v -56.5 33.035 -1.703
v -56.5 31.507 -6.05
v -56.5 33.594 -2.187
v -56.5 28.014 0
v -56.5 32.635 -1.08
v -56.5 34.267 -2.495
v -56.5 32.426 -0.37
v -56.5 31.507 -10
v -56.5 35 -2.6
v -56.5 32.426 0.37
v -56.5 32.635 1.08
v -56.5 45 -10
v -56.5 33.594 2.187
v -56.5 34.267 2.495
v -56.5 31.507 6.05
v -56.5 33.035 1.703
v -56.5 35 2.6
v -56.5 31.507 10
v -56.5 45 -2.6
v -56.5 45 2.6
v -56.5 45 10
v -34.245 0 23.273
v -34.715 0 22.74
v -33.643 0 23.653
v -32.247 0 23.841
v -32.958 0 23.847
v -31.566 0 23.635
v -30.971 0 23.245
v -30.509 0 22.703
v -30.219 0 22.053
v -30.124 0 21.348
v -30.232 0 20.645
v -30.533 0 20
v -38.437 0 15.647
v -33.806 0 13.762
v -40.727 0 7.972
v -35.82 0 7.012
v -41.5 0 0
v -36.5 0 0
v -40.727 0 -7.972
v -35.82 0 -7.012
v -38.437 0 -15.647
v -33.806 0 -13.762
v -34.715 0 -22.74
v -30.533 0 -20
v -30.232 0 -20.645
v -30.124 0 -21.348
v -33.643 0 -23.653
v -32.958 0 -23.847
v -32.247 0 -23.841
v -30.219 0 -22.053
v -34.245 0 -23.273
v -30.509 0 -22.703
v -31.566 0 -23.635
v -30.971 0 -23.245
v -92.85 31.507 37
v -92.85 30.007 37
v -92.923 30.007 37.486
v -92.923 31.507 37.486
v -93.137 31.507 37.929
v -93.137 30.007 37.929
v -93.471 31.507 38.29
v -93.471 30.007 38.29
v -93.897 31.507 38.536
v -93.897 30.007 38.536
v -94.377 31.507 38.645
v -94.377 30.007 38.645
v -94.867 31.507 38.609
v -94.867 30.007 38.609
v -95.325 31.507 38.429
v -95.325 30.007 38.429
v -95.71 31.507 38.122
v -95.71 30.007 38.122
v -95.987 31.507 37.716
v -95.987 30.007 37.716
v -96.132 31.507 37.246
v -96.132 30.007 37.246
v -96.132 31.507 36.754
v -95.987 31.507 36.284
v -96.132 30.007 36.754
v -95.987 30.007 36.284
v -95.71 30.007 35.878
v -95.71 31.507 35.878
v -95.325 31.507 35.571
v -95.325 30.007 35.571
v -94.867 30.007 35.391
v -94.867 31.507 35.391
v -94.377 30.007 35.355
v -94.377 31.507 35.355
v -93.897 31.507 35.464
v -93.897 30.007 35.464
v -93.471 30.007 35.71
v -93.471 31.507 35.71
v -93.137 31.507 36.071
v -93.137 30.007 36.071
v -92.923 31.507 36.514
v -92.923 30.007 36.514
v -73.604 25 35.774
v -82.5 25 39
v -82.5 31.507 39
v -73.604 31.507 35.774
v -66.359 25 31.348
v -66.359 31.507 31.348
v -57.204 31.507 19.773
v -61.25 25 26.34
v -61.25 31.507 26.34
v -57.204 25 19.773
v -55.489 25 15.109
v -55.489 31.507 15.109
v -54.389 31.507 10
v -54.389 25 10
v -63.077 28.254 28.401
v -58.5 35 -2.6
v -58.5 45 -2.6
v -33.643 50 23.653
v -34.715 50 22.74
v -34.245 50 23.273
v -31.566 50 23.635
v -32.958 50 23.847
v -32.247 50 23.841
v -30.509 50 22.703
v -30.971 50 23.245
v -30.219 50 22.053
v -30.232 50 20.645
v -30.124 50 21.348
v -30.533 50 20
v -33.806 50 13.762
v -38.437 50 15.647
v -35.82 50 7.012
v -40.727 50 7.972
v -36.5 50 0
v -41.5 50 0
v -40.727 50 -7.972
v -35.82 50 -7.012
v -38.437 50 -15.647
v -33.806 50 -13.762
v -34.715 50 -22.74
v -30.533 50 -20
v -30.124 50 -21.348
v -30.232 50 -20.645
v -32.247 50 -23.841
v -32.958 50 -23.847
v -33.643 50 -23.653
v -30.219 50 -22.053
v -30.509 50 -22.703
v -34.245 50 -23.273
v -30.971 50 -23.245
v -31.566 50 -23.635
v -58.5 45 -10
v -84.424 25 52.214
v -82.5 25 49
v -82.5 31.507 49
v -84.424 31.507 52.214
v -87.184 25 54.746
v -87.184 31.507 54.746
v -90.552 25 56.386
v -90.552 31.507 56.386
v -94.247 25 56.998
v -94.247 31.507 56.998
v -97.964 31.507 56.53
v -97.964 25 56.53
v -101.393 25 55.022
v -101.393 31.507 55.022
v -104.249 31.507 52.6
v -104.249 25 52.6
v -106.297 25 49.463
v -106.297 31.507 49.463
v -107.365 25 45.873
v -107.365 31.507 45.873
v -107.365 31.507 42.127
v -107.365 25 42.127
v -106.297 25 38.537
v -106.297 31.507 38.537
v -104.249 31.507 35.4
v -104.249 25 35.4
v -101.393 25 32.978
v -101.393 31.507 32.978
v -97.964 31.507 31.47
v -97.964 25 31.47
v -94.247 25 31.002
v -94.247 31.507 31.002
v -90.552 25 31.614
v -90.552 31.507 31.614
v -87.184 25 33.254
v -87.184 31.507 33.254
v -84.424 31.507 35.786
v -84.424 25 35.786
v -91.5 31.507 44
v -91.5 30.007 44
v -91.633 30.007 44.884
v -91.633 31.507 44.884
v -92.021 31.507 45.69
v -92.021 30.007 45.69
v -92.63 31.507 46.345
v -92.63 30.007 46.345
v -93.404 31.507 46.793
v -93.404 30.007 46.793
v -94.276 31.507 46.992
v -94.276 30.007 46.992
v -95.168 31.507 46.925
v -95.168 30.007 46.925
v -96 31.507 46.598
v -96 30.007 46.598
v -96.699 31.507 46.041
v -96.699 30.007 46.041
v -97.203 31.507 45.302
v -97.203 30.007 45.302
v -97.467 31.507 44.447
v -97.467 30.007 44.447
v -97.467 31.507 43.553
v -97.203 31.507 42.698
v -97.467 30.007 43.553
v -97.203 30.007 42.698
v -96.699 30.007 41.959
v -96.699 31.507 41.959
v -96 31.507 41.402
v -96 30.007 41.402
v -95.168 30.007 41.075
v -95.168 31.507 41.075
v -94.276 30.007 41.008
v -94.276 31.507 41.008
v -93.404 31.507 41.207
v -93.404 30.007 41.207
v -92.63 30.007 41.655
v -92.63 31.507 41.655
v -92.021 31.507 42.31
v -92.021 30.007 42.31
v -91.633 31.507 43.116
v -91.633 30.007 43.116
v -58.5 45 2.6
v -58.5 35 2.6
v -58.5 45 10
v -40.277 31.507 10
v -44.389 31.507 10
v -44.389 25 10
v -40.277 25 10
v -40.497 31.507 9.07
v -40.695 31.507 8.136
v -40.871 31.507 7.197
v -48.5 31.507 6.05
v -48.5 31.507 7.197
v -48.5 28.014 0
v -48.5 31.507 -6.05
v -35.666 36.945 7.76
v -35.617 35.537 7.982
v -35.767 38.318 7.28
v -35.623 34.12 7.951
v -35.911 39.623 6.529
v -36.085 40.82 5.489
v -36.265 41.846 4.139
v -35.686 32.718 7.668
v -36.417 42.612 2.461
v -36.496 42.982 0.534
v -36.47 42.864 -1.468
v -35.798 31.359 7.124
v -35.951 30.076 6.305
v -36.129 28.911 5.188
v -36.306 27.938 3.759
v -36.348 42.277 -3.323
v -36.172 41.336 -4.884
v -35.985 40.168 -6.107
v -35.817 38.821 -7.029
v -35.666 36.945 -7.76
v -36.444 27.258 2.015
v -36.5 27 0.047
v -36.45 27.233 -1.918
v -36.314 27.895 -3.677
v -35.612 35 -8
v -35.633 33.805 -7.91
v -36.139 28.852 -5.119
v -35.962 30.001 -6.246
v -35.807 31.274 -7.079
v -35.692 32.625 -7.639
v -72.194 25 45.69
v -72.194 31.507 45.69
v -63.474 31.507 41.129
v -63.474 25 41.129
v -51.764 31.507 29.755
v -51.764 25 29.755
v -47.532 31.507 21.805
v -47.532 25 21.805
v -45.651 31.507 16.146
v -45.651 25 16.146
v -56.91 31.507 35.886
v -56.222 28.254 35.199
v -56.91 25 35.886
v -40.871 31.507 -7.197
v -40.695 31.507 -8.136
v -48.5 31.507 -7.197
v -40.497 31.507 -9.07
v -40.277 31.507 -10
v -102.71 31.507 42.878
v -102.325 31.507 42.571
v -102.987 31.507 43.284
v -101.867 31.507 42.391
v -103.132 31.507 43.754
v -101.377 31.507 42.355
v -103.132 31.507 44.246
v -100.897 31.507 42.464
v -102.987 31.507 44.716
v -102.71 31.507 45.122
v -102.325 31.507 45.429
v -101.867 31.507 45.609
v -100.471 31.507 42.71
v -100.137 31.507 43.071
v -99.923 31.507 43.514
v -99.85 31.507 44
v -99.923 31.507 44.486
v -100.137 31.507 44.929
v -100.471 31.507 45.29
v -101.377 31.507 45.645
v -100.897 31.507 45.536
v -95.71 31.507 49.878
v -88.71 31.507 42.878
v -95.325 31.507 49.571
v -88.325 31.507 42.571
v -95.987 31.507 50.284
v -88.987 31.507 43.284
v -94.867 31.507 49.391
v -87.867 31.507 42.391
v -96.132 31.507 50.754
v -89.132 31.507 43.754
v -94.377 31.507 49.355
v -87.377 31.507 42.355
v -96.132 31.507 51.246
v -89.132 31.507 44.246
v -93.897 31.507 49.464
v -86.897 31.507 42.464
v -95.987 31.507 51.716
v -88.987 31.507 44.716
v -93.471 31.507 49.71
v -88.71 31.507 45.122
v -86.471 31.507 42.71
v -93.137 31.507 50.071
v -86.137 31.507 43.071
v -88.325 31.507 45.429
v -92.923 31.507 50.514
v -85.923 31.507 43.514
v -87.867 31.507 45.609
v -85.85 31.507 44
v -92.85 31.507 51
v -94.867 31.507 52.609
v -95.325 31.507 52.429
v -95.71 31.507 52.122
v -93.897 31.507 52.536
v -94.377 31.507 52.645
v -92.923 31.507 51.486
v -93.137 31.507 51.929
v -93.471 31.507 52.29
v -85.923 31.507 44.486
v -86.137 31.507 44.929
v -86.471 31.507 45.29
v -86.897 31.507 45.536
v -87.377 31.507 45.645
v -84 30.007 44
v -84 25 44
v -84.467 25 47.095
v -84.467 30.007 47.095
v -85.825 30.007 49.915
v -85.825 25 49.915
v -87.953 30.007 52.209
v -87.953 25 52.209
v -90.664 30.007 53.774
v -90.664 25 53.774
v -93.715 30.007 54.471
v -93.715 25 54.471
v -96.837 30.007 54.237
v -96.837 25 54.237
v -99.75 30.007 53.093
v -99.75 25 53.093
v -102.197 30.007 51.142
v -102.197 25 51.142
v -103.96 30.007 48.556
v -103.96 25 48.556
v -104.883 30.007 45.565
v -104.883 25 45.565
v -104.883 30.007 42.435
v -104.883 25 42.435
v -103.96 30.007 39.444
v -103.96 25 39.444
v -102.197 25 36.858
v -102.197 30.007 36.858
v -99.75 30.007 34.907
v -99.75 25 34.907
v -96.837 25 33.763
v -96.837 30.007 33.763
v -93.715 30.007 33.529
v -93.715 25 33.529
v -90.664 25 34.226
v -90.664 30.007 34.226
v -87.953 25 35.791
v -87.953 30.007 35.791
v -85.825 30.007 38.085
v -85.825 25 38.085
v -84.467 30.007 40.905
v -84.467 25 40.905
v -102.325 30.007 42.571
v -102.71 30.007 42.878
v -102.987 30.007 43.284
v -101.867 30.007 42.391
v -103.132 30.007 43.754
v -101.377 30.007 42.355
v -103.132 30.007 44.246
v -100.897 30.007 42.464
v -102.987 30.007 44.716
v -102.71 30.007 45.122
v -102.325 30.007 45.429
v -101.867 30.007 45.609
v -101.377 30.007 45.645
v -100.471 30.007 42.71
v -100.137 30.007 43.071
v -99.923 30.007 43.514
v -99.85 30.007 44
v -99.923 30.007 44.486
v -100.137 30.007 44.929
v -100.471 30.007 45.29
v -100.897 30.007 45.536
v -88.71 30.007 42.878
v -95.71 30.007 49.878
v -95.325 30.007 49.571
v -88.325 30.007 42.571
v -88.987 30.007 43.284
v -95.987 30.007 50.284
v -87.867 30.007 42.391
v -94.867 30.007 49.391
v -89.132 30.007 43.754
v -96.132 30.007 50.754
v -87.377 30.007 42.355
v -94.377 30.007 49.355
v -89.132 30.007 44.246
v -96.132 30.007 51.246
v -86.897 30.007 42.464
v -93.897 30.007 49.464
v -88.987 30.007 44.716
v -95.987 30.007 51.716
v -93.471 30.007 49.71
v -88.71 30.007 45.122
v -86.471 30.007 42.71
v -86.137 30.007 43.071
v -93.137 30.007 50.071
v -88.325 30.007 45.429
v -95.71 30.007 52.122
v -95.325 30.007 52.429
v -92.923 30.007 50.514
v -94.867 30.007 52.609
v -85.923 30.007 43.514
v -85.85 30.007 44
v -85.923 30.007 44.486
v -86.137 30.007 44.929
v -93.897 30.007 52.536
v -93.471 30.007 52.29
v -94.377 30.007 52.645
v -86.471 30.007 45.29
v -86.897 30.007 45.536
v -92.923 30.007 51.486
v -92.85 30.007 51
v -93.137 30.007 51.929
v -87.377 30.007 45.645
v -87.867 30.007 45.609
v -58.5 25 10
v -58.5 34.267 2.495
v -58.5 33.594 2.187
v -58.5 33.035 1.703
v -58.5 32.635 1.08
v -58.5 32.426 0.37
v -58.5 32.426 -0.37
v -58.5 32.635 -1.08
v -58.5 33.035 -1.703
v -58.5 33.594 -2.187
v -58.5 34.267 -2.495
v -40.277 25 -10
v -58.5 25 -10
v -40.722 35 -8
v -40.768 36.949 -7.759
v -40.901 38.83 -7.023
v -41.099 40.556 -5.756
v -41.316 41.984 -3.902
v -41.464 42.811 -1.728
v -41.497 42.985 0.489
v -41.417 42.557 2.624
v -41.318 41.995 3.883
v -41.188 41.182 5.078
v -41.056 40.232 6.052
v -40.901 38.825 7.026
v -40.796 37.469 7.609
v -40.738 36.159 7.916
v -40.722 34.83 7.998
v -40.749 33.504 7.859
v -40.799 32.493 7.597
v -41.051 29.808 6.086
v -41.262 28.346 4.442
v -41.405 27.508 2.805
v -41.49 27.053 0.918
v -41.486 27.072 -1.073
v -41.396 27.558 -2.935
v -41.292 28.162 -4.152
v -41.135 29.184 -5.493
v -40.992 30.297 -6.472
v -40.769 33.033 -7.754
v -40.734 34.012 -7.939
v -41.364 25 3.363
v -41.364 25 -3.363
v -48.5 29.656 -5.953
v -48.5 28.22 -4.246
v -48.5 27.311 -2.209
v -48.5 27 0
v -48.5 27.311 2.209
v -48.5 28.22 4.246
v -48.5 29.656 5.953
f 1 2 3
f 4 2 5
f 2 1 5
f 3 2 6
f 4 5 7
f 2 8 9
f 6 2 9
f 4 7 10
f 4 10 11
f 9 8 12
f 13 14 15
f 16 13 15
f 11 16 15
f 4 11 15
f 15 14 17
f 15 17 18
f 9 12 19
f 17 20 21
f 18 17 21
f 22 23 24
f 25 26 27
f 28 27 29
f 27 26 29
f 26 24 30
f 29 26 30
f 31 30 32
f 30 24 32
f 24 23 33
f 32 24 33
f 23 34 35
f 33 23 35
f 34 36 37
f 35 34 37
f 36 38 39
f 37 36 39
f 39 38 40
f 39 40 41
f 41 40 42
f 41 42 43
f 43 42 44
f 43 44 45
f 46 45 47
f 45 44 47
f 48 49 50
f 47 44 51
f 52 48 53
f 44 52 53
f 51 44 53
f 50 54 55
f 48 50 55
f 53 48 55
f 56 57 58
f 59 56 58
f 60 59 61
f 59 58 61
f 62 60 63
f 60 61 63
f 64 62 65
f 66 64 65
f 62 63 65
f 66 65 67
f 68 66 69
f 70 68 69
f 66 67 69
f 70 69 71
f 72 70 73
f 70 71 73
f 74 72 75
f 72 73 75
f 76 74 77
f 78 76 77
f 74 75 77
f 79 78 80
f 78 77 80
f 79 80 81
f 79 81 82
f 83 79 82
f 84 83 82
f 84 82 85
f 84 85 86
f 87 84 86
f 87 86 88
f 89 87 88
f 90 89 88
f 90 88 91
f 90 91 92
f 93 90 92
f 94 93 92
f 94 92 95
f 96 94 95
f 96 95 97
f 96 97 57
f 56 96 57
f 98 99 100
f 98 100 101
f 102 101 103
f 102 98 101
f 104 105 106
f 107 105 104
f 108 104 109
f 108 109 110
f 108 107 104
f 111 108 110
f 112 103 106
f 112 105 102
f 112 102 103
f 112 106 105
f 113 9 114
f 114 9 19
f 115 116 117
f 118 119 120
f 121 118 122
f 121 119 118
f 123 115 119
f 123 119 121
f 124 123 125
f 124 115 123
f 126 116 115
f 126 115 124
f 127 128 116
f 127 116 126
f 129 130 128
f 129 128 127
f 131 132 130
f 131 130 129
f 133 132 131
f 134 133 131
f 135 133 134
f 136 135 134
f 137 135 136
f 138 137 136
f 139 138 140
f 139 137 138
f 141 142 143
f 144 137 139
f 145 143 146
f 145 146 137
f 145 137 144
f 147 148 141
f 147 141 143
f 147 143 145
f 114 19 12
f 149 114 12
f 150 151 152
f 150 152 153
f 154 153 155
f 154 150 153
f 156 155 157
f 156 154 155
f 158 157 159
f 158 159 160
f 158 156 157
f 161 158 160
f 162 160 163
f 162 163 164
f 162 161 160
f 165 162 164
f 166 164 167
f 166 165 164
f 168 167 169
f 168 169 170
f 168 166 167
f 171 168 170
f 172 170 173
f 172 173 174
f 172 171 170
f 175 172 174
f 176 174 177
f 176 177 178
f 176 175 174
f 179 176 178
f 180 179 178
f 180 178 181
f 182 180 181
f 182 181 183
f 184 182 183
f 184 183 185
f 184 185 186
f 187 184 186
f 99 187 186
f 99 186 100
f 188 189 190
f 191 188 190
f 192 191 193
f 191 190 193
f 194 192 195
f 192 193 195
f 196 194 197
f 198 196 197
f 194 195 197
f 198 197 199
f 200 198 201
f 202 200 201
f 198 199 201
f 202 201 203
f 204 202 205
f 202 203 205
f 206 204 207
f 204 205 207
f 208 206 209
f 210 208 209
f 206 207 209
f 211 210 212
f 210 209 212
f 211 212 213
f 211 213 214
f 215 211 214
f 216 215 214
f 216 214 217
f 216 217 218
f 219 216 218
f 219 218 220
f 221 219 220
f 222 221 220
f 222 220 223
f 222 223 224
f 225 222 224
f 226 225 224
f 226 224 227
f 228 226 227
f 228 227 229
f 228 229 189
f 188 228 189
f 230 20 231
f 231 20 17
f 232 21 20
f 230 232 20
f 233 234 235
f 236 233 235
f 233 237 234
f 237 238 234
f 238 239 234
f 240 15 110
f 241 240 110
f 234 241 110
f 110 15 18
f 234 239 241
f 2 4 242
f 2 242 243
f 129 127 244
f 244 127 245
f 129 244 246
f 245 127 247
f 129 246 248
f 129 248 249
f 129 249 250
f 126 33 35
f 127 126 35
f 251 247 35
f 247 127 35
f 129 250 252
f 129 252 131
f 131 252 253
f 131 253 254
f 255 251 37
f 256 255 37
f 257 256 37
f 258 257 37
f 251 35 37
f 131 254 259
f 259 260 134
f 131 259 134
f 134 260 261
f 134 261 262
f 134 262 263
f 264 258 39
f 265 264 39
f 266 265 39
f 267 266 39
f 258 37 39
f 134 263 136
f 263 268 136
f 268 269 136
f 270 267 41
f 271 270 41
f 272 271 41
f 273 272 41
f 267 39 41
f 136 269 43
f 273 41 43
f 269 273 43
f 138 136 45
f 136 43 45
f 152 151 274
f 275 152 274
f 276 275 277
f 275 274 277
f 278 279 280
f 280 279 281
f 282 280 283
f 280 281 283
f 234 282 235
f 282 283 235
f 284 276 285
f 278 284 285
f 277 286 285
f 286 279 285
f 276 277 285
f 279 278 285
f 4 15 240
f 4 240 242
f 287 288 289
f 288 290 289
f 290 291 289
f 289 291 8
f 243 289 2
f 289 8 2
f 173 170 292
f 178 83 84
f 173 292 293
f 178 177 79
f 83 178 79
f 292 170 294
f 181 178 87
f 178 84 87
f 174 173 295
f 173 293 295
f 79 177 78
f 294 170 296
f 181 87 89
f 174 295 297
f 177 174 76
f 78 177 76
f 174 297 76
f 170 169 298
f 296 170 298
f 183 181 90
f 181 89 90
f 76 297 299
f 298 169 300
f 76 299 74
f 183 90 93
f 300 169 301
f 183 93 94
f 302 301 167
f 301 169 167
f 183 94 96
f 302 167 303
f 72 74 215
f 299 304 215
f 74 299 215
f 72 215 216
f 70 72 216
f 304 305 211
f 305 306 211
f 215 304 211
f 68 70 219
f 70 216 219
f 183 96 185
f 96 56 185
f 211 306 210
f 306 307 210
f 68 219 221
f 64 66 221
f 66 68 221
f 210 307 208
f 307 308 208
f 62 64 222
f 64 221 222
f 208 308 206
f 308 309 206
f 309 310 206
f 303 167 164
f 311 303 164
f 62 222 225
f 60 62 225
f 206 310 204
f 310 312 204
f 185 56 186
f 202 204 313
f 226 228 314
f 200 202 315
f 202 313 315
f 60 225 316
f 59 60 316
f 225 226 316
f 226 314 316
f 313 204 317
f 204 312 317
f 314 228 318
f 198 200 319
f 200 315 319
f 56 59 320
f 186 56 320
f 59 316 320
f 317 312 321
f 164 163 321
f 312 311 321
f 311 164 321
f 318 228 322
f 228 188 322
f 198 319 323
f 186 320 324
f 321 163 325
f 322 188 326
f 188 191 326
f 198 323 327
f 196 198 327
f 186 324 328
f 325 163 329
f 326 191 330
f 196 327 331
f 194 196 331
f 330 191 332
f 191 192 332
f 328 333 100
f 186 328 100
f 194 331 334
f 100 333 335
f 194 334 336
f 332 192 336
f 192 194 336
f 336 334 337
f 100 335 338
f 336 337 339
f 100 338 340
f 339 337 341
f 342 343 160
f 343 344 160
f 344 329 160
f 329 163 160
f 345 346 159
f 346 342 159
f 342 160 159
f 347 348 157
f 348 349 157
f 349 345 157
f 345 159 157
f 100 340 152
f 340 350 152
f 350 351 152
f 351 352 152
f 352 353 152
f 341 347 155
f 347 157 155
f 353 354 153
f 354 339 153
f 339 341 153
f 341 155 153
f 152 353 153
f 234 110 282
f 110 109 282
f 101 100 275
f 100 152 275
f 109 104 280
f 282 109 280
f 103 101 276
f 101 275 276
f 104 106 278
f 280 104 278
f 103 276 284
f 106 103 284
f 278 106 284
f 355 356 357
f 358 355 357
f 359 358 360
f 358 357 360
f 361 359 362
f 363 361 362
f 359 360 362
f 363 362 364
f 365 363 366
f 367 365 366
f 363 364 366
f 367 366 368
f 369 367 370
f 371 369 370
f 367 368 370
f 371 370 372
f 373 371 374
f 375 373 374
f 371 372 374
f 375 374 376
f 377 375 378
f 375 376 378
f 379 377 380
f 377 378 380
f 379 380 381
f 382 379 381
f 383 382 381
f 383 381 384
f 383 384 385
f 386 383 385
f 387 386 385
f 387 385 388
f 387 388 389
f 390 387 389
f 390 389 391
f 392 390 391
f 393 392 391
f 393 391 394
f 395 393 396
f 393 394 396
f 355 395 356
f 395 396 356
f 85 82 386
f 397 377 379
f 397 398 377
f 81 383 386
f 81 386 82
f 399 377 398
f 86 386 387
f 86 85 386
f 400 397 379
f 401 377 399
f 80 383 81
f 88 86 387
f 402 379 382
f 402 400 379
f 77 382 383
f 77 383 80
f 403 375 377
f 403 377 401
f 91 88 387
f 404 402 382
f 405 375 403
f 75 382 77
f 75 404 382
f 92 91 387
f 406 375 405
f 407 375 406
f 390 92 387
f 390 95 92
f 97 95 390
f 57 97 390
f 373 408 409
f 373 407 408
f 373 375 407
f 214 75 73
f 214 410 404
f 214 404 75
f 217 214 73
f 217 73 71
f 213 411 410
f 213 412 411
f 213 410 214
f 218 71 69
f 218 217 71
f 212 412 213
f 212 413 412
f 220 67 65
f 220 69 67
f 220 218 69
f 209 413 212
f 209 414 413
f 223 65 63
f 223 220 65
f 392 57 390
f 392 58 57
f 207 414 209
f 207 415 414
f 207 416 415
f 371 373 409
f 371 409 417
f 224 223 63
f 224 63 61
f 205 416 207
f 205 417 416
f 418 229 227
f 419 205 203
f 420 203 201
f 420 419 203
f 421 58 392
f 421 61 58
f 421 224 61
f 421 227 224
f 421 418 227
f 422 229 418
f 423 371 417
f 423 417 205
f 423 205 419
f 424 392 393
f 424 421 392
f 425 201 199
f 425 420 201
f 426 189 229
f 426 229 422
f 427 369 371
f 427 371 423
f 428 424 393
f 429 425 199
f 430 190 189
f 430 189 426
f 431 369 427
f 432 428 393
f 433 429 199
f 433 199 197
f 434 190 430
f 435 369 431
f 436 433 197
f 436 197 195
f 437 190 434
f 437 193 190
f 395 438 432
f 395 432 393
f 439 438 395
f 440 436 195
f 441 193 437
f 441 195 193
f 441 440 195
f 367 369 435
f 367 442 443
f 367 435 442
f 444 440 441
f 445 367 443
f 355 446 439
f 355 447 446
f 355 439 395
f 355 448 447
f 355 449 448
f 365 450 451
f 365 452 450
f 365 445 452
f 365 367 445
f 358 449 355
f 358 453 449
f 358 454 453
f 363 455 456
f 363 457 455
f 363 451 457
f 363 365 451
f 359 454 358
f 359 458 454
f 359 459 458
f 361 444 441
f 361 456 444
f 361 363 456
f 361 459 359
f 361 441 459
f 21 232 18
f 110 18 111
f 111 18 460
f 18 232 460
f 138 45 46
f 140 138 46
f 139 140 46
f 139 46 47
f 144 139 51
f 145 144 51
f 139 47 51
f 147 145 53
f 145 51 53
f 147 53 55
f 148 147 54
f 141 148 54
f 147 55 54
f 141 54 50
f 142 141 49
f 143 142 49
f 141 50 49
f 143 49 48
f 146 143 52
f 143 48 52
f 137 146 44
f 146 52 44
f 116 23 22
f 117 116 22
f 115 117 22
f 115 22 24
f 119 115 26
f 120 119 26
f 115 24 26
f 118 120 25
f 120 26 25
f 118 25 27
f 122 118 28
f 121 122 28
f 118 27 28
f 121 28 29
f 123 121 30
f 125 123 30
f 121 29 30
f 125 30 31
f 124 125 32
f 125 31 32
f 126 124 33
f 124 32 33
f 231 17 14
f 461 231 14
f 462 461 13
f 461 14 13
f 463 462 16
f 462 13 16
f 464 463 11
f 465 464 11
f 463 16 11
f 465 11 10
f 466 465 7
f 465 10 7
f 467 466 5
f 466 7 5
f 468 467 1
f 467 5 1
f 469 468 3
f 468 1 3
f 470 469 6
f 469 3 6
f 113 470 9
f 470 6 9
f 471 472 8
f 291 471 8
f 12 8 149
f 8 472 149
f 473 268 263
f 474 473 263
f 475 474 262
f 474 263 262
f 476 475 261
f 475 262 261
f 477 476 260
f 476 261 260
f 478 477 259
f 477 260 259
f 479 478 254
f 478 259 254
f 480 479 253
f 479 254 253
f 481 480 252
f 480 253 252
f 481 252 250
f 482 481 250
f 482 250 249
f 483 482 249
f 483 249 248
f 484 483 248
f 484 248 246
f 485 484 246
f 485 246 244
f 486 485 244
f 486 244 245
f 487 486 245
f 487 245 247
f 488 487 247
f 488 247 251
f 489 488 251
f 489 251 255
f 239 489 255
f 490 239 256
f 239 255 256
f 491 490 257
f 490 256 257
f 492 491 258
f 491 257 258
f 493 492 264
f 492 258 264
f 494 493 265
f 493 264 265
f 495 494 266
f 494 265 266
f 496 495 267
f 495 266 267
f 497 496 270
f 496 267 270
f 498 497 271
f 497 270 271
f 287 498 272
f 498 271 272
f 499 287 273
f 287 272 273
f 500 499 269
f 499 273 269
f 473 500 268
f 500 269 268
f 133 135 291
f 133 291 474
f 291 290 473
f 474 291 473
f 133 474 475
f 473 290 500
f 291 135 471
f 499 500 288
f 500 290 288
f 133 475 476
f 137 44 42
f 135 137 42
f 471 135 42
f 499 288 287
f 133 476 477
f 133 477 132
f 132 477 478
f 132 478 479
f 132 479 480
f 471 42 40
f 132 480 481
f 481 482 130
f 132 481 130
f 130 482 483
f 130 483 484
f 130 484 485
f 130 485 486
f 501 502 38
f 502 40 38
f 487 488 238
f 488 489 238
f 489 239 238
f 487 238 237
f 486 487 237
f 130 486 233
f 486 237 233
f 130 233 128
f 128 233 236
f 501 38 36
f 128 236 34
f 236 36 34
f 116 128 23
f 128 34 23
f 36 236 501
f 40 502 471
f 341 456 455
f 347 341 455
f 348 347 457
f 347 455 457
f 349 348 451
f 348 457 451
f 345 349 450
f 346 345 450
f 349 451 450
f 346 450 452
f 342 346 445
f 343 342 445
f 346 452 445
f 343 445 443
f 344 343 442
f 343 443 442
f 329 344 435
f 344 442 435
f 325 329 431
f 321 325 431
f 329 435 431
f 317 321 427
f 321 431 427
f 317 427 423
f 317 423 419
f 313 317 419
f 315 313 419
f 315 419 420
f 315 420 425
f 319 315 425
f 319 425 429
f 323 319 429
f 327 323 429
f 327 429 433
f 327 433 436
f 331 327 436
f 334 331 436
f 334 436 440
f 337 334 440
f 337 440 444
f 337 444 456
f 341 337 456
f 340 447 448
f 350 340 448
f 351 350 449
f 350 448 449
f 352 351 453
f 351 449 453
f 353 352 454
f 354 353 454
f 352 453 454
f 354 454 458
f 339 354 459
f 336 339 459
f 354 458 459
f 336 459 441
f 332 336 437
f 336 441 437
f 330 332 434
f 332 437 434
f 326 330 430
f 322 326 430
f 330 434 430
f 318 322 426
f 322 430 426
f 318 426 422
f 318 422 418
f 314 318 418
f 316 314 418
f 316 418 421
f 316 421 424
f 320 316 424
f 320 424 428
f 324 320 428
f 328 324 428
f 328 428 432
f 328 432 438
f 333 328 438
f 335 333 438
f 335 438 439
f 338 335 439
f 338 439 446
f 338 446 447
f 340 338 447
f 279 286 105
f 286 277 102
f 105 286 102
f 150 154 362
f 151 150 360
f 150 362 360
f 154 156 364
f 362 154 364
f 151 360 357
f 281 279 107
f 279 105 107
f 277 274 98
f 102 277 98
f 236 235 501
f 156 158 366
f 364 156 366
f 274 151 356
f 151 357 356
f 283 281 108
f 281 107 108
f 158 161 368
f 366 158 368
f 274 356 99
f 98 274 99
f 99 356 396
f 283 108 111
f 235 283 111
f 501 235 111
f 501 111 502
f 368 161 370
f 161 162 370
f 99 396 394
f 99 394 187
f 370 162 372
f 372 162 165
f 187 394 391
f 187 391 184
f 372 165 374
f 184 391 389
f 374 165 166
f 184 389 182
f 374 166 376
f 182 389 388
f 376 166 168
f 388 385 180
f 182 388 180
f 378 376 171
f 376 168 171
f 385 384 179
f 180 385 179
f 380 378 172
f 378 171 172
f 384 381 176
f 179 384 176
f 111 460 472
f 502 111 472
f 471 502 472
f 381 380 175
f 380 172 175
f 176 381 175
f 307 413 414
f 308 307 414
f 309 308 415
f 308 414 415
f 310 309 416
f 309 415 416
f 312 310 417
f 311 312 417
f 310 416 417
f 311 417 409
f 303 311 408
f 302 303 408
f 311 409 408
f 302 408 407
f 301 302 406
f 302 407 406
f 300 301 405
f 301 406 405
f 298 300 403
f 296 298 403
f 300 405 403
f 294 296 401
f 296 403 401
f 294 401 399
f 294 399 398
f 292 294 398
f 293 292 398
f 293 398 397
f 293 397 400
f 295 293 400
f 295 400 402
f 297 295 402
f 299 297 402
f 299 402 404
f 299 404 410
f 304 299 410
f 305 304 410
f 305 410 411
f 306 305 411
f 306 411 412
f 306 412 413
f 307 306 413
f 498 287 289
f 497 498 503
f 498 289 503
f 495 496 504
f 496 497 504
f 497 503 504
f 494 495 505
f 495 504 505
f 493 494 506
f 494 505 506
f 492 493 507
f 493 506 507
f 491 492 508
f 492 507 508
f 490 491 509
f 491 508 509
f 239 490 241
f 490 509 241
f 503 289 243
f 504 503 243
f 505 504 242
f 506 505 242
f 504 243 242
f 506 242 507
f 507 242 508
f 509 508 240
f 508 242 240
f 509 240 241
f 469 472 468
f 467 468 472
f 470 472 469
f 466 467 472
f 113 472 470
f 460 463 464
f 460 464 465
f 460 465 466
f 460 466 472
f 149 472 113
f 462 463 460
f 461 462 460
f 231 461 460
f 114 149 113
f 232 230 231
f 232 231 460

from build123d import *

# Parameters (mm, degrees)
BOSS_EXTRU_1_DEPTH      = 50
ESQUISSE2_R             = 8
ENL_V_MAT_EXTRU_1_DEPTH = 42.5
BOSS_EXTRU_3_DEPTH      = 2
BOSS_EXTRU_4_DEPTH      = 8
BOSS_EXTRU_5_DEPTH      = 8.222835
ESQUISSE8_R             = 1.65
ESQUISSE8_R_2           = 3
BOSS_EXTRU_6_DEPTH      = 6.507031
ESQUISSE9_R             = 10.5
ENL_V_MAT_EXTRU_2_DEPTH = 5.007031


with BuildPart() as part:
    # Esquisse1 → Boss.-Extru.1 (new body)
    with BuildSketch(Plane(origin=(0, 0, 0), x_dir=(1, 0, 0), z_dir=(0, 1, 0))):
        with BuildLine():
            ThreePointArc((-34.715340416, 22.739726027), (-41.5, 0), (-34.715340416, -22.739726027))
            ThreePointArc((-34.715340416, -22.739726027), (-31.254191835, -23.461148581), (-30.532769282, -20))
            ThreePointArc((-30.532769282, -20), (-36.5, 0), (-30.532769282, 20))
            ThreePointArc((-30.532769282, 20), (-31.254191835, 23.461148581), (-34.715340416, 22.739726027))
        make_face()
    extrude(amount=BOSS_EXTRU_1_DEPTH)

    # Esquisse2 → Enlèv. mat.-Extru.1 (cut, through all)
    with BuildSketch(Plane(origin=(0, 0, 0), x_dir=(0, 0, -1), z_dir=(1, 0, 0))):
        with Locations((0, 35)):
            Circle(ESQUISSE2_R)
    extrude(amount=-ENL_V_MAT_EXTRU_1_DEPTH, mode=Mode.SUBTRACT)



with BuildPart() as body_2:
    # Esquisse4 → Boss.-Extru.3 (new body)
    with BuildSketch(Plane.ZY.offset(56.5)):
        with BuildLine():
            Line((-2.6, 35), (-2.6, 45))
            Line((-2.6, 45), (-10, 45))
            Line((-10, 45), (-10, 25))
            Line((-10, 25), (10, 25))
            Line((10, 25), (10, 45))
            Line((10, 45), (2.6, 45))
            Line((2.6, 45), (2.6, 35))
            ThreePointArc((2.6, 35), (0, 32.4), (-2.6, 35))
        make_face()
    extrude(amount=BOSS_EXTRU_3_DEPTH)

    # Esquisse6 → Boss.-Extru.4 (add)
    with BuildSketch(Plane.ZY.offset(56.5)):
        Polygon((6.05, 31.507030871), (0, 28.014061743), (-6.05, 31.507030871), (-10, 31.507030871), (-10, 25), (10, 25), (10, 31.507030871), align=None)
    extrude(amount=-BOSS_EXTRU_4_DEPTH)


with BuildPart() as part_1:
    add(part.part)

    add(body_2.part)  # Boss.-Extru.5 merges body 2
    # Esquisse7 → Boss.-Extru.5 (add)
    with BuildSketch(Plane(origin=(-48.5, 0, 0), x_dir=(0, 0, -1), z_dir=(1, 0, 0))):
        with BuildLine():
            Line((10, 31.507030871), (7.197163793, 31.507030871))
            ThreePointArc((7.197163793, 31.507030871), (0, 27), (-7.197163793, 31.507030871))
            Line((-7.197163793, 31.507030871), (-10, 31.507030871))
            Line((-10, 31.507030871), (-10, 25))
            Line((-10, 25), (10, 25))
            Line((10, 25), (10, 31.507030871))
        make_face()
    extrude(amount=BOSS_EXTRU_5_DEPTH)

    # Esquisse8 → Boss.-Extru.6 (add)
    with BuildSketch(Plane.XZ.offset(-25)):
        with BuildLine():
            Line((-54.388582373, 10), (-44.388582373, 10))
            add(Edge.make_bspline(
                [(-82.50013532, 49), (-49.000452969, 40.897437534), (-44.388582373, 10)],
                knots=[0, 0, 0, 1, 1, 1], degree=2))
            ThreePointArc((-82.50013532, 49), (-107.50013532, 44), (-82.50013532, 39))
            add(Edge.make_bspline(
                [(-82.50013532, 39), (-57.708994437, 32.301835207), (-54.388582373, 10)],
                knots=[0, 0, 0, 1, 1, 1], degree=2))
        make_face()
        with Locations((-87.50013532, 44)):
            Circle(ESQUISSE8_R, mode=Mode.SUBTRACT)
        with Locations((-94.50013532, 37)):
            Circle(ESQUISSE8_R, mode=Mode.SUBTRACT)
        with Locations((-101.50013532, 44)):
            Circle(ESQUISSE8_R, mode=Mode.SUBTRACT)
        with Locations((-94.50013532, 51)):
            Circle(ESQUISSE8_R, mode=Mode.SUBTRACT)
        with Locations((-94.50013532, 44)):
            Circle(ESQUISSE8_R_2, mode=Mode.SUBTRACT)
    extrude(amount=-BOSS_EXTRU_6_DEPTH)

    # Esquisse9 → Enlèv. mat.-Extru.2 (cut)
    with BuildSketch(Plane.XZ.offset(-25)):
        with Locations((-94.50013532, 44)):
            Circle(ESQUISSE9_R)
    extrude(amount=-ENL_V_MAT_EXTRU_2_DEPTH, mode=Mode.SUBTRACT)


solid = part_1.part
